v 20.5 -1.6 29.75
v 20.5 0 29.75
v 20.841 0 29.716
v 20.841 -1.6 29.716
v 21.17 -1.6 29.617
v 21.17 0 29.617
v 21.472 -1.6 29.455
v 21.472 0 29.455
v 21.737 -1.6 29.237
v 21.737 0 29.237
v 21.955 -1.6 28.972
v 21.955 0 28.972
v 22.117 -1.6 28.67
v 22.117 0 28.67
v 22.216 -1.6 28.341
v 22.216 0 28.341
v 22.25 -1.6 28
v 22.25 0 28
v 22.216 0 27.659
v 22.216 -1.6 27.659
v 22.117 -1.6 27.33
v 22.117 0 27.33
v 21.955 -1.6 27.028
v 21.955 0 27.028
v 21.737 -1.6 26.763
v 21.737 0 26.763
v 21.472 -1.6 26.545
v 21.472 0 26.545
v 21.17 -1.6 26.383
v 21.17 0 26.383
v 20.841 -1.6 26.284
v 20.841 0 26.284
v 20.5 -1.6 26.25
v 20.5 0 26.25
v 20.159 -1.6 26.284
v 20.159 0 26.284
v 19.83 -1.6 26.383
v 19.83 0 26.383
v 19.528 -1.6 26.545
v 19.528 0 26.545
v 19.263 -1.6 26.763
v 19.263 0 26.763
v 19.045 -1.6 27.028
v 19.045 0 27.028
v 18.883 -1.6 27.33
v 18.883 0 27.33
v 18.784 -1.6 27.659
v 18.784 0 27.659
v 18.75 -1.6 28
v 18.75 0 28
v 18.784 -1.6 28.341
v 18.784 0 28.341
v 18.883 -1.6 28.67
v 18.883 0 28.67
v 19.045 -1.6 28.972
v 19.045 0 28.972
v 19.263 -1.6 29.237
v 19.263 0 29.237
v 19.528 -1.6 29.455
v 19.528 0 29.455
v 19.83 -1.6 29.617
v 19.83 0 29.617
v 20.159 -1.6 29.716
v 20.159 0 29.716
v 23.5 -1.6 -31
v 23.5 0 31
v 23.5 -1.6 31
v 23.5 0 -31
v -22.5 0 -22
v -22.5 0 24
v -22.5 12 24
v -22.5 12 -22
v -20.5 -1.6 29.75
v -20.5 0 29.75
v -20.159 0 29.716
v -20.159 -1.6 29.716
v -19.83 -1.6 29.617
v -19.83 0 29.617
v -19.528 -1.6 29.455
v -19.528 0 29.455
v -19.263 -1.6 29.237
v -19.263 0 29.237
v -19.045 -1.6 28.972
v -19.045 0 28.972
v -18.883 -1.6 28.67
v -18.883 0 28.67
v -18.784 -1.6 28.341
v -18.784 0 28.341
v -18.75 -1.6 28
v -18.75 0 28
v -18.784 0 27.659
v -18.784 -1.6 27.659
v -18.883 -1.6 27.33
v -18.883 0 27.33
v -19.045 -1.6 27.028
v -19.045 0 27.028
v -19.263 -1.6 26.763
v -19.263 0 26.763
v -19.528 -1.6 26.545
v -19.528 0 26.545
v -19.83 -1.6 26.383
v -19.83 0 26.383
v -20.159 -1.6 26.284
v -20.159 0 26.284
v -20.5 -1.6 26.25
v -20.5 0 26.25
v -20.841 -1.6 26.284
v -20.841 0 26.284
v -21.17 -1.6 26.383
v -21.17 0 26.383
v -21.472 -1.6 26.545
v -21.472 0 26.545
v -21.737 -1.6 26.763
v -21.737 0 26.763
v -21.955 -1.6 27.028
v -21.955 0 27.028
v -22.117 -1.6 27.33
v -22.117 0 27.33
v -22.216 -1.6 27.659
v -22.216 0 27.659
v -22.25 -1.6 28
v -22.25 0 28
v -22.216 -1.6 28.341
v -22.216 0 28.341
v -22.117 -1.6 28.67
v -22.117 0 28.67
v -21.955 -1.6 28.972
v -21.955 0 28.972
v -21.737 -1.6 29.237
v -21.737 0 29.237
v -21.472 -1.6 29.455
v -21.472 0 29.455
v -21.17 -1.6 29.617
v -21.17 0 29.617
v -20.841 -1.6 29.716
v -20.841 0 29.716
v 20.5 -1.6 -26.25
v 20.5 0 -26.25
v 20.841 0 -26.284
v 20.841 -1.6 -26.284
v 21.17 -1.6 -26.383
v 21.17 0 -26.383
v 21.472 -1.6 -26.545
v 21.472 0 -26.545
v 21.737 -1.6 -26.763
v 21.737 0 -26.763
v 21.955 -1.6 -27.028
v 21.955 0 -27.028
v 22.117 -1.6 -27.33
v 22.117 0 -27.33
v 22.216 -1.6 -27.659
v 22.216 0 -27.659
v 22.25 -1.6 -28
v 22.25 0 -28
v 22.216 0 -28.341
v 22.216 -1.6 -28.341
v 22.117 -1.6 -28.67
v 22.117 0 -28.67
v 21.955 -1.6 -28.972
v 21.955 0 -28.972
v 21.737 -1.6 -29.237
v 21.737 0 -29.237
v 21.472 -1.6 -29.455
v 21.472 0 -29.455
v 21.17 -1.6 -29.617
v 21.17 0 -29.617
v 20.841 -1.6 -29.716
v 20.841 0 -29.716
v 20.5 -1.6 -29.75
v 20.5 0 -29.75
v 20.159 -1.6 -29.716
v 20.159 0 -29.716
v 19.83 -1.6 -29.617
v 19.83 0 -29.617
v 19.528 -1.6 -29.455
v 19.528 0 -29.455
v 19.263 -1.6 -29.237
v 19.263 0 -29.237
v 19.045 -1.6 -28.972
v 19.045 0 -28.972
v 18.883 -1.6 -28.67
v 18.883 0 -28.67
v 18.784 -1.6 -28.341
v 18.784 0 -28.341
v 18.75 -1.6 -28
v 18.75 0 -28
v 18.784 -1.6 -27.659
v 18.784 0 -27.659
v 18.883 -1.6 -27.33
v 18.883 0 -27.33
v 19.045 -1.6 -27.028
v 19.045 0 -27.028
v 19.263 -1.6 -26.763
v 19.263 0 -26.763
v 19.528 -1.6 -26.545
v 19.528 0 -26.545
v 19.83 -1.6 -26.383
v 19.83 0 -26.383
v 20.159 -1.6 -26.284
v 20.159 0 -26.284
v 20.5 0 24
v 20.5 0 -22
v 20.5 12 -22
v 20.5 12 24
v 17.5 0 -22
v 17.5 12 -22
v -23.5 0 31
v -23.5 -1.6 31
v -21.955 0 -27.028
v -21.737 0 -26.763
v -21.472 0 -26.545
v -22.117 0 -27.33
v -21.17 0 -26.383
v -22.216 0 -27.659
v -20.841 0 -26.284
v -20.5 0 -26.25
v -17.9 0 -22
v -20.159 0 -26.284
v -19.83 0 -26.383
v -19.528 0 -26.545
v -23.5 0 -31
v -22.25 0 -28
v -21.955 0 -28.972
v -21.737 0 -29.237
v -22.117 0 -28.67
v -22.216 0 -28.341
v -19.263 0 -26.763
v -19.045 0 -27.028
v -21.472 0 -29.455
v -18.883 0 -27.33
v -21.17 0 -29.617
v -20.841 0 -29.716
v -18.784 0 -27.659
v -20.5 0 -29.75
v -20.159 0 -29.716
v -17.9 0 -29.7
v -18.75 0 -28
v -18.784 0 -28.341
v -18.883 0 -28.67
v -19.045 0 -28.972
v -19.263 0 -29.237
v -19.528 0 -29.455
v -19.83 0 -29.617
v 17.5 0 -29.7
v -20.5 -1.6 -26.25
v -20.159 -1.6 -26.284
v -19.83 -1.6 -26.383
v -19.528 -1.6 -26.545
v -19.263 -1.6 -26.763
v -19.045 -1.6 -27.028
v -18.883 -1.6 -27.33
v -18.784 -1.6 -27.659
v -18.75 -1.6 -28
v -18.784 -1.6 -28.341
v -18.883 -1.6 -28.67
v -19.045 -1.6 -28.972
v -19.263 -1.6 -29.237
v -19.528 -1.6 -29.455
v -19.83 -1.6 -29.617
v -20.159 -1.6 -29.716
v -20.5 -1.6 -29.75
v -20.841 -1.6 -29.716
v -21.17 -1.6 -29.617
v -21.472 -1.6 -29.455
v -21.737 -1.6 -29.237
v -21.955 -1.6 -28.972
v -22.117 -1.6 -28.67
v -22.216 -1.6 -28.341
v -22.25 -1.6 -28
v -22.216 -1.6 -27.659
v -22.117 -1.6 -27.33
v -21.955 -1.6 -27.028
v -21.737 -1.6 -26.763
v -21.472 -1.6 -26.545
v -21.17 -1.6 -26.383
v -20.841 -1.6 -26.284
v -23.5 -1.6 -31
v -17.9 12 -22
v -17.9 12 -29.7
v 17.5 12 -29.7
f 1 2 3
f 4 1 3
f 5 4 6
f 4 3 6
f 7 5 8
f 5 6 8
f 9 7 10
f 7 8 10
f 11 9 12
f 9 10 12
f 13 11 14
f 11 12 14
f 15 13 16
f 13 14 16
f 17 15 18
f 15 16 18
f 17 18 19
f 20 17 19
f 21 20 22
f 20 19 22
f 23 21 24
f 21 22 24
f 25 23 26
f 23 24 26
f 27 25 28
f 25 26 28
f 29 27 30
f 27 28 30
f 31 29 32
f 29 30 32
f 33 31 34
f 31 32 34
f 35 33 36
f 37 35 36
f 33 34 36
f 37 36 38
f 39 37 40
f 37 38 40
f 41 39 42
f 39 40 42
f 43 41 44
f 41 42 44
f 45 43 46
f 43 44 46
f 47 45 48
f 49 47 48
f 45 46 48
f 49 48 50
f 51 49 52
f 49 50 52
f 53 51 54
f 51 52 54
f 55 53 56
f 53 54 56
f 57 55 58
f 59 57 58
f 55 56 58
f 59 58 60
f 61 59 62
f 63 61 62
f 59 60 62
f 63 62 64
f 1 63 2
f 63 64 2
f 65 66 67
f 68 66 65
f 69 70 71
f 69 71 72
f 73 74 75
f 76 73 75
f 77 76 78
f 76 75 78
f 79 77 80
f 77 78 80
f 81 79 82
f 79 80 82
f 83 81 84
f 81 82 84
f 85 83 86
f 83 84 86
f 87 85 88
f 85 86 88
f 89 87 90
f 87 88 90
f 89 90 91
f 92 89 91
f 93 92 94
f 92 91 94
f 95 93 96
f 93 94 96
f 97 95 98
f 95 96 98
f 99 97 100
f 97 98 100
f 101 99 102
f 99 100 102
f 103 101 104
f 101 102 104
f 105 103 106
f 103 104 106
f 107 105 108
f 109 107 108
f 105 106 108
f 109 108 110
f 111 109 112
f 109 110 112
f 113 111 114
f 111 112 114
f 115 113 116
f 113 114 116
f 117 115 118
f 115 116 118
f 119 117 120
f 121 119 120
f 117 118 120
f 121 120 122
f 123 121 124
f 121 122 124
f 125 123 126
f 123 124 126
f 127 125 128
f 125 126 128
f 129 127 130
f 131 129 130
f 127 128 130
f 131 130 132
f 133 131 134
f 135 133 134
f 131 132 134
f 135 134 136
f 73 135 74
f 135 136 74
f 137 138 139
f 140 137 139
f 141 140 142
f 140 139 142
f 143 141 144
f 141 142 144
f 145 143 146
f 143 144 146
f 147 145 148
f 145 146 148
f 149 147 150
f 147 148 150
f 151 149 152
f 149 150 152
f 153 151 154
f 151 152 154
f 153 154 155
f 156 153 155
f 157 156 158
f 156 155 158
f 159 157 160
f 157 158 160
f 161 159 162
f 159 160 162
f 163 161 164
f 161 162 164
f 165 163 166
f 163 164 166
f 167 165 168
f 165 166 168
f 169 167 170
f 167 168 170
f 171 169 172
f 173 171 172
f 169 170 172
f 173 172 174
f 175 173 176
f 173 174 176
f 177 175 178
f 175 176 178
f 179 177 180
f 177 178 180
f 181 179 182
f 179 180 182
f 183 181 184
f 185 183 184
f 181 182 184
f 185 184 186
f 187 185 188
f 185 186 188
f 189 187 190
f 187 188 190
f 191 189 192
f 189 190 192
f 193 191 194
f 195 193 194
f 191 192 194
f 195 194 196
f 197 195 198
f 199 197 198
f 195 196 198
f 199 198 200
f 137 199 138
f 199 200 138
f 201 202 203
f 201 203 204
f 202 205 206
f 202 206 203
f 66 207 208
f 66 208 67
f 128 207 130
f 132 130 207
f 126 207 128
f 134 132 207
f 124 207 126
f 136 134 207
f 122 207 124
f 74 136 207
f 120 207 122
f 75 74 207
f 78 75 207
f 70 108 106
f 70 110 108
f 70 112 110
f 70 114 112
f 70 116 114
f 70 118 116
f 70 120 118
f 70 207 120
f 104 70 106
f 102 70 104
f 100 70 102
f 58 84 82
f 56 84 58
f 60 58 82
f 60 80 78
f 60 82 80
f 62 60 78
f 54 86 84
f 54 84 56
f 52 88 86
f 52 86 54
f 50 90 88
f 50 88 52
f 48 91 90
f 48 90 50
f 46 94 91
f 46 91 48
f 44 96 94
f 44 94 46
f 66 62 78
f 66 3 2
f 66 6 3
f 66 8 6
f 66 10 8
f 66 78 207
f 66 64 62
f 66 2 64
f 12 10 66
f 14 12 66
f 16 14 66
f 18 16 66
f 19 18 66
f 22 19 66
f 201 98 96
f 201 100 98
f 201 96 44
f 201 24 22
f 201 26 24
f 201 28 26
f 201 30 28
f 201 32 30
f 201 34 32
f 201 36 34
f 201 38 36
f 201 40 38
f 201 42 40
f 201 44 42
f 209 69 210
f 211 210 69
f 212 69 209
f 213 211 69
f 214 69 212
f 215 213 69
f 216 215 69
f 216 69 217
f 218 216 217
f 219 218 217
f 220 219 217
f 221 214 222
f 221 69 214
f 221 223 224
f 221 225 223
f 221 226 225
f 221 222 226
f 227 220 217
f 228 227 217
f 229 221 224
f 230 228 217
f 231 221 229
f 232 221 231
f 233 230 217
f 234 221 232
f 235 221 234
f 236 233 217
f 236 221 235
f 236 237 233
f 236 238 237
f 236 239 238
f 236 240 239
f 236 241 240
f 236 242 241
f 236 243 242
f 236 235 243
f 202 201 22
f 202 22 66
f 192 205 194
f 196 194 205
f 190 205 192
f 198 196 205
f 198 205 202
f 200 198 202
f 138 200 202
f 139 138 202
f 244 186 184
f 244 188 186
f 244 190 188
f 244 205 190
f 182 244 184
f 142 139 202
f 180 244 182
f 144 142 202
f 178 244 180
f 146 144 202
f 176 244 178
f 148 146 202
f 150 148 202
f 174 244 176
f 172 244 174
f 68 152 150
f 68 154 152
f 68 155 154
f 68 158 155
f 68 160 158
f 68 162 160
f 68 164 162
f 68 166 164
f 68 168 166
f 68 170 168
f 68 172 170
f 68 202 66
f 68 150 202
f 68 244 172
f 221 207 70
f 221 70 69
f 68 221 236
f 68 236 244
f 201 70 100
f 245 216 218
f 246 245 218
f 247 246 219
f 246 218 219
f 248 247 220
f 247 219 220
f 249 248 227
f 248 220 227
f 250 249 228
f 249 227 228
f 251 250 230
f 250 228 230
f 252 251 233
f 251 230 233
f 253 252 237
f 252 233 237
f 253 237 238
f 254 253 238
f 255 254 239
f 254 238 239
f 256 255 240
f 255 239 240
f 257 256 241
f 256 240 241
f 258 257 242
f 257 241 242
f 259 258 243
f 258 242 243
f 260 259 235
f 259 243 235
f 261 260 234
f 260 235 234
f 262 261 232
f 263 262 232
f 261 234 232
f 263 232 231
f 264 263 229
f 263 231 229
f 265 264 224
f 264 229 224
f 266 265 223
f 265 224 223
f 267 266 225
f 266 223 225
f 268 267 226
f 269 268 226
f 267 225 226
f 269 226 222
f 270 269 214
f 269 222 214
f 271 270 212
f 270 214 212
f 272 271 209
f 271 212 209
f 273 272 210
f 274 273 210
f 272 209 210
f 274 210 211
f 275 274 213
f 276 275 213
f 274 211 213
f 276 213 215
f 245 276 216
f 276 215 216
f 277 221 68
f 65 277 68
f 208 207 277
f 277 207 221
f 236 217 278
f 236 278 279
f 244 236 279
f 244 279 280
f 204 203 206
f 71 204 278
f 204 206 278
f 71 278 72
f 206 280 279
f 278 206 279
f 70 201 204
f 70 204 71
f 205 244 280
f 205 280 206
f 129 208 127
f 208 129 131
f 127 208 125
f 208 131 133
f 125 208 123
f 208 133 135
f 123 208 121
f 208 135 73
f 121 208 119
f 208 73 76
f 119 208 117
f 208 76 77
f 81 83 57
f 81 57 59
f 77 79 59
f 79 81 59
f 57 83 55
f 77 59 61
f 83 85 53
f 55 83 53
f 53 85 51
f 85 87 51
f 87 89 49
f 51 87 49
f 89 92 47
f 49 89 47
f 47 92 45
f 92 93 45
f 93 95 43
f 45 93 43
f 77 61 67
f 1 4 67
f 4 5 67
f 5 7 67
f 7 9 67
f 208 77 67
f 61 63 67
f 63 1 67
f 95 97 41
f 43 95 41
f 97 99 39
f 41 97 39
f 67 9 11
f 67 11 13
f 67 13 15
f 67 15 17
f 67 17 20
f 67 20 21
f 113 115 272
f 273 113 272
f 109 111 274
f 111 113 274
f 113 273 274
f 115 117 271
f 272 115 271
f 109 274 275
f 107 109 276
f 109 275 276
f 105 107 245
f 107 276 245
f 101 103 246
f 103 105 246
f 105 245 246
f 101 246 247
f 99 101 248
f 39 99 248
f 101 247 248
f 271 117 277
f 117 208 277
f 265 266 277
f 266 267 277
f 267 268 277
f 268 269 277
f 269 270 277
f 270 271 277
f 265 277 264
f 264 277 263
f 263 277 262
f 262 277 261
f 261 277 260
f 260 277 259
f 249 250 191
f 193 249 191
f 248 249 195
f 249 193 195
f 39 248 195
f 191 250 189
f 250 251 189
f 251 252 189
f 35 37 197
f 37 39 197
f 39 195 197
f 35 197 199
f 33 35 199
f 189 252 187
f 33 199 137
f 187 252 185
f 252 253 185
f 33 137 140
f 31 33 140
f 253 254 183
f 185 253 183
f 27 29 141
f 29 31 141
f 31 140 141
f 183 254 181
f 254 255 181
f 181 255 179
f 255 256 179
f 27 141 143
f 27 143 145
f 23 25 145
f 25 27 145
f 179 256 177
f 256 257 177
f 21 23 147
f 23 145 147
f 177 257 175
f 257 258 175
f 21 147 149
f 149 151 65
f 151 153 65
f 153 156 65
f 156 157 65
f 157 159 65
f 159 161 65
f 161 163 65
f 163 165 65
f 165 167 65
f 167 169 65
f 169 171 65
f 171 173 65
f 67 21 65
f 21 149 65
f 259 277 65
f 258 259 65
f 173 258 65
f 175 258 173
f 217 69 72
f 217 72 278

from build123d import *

# Parameters (mm, degrees)
SKETCH1_W           = 47
SKETCH1_H           = 62
SKETCH1_R           = 1.75
BOSS_EXTRUDE1_DEPTH = 1.6
BOSS_EXTRUDE2_DEPTH = 12


with BuildPart() as part:
    # Sketch1 → Boss-Extrude1 (new body)
    with BuildSketch(Plane(origin=(0, 0, 0), x_dir=(1, 0, 0), z_dir=(0, 1, 0))):
        Rectangle(SKETCH1_W, SKETCH1_H)
        with Locations(Location((-20.5, -28, 0), (0, 0, 270))):
            Circle(SKETCH1_R, mode=Mode.SUBTRACT)
        with Locations(Location((20.5, -28, 0), (0, 0, 270))):
            Circle(SKETCH1_R, mode=Mode.SUBTRACT)
        with Locations(Location((20.5, 28, 0), (0, 0, 270))):
            Circle(SKETCH1_R, mode=Mode.SUBTRACT)
        with Locations(Location((-20.5, 28, 0), (0, 0, 270))):
            Circle(SKETCH1_R, mode=Mode.SUBTRACT)
    extrude(amount=-BOSS_EXTRUDE1_DEPTH)

    # Sketch3 → Boss-Extrude2 (add)
    with BuildSketch(Plane(origin=(0, 0, 0), x_dir=(1, 0, 0), z_dir=(0, 1, 0))):
        Polygon((-22.5, 22), (-17.9, 22), (-17.9, 29.7), (17.5, 29.7), (17.5, 22), (20.5, 22), (20.5, -24), (-22.5, -24), align=None)
    extrude(amount=BOSS_EXTRUDE2_DEPTH)


solid = part.part
